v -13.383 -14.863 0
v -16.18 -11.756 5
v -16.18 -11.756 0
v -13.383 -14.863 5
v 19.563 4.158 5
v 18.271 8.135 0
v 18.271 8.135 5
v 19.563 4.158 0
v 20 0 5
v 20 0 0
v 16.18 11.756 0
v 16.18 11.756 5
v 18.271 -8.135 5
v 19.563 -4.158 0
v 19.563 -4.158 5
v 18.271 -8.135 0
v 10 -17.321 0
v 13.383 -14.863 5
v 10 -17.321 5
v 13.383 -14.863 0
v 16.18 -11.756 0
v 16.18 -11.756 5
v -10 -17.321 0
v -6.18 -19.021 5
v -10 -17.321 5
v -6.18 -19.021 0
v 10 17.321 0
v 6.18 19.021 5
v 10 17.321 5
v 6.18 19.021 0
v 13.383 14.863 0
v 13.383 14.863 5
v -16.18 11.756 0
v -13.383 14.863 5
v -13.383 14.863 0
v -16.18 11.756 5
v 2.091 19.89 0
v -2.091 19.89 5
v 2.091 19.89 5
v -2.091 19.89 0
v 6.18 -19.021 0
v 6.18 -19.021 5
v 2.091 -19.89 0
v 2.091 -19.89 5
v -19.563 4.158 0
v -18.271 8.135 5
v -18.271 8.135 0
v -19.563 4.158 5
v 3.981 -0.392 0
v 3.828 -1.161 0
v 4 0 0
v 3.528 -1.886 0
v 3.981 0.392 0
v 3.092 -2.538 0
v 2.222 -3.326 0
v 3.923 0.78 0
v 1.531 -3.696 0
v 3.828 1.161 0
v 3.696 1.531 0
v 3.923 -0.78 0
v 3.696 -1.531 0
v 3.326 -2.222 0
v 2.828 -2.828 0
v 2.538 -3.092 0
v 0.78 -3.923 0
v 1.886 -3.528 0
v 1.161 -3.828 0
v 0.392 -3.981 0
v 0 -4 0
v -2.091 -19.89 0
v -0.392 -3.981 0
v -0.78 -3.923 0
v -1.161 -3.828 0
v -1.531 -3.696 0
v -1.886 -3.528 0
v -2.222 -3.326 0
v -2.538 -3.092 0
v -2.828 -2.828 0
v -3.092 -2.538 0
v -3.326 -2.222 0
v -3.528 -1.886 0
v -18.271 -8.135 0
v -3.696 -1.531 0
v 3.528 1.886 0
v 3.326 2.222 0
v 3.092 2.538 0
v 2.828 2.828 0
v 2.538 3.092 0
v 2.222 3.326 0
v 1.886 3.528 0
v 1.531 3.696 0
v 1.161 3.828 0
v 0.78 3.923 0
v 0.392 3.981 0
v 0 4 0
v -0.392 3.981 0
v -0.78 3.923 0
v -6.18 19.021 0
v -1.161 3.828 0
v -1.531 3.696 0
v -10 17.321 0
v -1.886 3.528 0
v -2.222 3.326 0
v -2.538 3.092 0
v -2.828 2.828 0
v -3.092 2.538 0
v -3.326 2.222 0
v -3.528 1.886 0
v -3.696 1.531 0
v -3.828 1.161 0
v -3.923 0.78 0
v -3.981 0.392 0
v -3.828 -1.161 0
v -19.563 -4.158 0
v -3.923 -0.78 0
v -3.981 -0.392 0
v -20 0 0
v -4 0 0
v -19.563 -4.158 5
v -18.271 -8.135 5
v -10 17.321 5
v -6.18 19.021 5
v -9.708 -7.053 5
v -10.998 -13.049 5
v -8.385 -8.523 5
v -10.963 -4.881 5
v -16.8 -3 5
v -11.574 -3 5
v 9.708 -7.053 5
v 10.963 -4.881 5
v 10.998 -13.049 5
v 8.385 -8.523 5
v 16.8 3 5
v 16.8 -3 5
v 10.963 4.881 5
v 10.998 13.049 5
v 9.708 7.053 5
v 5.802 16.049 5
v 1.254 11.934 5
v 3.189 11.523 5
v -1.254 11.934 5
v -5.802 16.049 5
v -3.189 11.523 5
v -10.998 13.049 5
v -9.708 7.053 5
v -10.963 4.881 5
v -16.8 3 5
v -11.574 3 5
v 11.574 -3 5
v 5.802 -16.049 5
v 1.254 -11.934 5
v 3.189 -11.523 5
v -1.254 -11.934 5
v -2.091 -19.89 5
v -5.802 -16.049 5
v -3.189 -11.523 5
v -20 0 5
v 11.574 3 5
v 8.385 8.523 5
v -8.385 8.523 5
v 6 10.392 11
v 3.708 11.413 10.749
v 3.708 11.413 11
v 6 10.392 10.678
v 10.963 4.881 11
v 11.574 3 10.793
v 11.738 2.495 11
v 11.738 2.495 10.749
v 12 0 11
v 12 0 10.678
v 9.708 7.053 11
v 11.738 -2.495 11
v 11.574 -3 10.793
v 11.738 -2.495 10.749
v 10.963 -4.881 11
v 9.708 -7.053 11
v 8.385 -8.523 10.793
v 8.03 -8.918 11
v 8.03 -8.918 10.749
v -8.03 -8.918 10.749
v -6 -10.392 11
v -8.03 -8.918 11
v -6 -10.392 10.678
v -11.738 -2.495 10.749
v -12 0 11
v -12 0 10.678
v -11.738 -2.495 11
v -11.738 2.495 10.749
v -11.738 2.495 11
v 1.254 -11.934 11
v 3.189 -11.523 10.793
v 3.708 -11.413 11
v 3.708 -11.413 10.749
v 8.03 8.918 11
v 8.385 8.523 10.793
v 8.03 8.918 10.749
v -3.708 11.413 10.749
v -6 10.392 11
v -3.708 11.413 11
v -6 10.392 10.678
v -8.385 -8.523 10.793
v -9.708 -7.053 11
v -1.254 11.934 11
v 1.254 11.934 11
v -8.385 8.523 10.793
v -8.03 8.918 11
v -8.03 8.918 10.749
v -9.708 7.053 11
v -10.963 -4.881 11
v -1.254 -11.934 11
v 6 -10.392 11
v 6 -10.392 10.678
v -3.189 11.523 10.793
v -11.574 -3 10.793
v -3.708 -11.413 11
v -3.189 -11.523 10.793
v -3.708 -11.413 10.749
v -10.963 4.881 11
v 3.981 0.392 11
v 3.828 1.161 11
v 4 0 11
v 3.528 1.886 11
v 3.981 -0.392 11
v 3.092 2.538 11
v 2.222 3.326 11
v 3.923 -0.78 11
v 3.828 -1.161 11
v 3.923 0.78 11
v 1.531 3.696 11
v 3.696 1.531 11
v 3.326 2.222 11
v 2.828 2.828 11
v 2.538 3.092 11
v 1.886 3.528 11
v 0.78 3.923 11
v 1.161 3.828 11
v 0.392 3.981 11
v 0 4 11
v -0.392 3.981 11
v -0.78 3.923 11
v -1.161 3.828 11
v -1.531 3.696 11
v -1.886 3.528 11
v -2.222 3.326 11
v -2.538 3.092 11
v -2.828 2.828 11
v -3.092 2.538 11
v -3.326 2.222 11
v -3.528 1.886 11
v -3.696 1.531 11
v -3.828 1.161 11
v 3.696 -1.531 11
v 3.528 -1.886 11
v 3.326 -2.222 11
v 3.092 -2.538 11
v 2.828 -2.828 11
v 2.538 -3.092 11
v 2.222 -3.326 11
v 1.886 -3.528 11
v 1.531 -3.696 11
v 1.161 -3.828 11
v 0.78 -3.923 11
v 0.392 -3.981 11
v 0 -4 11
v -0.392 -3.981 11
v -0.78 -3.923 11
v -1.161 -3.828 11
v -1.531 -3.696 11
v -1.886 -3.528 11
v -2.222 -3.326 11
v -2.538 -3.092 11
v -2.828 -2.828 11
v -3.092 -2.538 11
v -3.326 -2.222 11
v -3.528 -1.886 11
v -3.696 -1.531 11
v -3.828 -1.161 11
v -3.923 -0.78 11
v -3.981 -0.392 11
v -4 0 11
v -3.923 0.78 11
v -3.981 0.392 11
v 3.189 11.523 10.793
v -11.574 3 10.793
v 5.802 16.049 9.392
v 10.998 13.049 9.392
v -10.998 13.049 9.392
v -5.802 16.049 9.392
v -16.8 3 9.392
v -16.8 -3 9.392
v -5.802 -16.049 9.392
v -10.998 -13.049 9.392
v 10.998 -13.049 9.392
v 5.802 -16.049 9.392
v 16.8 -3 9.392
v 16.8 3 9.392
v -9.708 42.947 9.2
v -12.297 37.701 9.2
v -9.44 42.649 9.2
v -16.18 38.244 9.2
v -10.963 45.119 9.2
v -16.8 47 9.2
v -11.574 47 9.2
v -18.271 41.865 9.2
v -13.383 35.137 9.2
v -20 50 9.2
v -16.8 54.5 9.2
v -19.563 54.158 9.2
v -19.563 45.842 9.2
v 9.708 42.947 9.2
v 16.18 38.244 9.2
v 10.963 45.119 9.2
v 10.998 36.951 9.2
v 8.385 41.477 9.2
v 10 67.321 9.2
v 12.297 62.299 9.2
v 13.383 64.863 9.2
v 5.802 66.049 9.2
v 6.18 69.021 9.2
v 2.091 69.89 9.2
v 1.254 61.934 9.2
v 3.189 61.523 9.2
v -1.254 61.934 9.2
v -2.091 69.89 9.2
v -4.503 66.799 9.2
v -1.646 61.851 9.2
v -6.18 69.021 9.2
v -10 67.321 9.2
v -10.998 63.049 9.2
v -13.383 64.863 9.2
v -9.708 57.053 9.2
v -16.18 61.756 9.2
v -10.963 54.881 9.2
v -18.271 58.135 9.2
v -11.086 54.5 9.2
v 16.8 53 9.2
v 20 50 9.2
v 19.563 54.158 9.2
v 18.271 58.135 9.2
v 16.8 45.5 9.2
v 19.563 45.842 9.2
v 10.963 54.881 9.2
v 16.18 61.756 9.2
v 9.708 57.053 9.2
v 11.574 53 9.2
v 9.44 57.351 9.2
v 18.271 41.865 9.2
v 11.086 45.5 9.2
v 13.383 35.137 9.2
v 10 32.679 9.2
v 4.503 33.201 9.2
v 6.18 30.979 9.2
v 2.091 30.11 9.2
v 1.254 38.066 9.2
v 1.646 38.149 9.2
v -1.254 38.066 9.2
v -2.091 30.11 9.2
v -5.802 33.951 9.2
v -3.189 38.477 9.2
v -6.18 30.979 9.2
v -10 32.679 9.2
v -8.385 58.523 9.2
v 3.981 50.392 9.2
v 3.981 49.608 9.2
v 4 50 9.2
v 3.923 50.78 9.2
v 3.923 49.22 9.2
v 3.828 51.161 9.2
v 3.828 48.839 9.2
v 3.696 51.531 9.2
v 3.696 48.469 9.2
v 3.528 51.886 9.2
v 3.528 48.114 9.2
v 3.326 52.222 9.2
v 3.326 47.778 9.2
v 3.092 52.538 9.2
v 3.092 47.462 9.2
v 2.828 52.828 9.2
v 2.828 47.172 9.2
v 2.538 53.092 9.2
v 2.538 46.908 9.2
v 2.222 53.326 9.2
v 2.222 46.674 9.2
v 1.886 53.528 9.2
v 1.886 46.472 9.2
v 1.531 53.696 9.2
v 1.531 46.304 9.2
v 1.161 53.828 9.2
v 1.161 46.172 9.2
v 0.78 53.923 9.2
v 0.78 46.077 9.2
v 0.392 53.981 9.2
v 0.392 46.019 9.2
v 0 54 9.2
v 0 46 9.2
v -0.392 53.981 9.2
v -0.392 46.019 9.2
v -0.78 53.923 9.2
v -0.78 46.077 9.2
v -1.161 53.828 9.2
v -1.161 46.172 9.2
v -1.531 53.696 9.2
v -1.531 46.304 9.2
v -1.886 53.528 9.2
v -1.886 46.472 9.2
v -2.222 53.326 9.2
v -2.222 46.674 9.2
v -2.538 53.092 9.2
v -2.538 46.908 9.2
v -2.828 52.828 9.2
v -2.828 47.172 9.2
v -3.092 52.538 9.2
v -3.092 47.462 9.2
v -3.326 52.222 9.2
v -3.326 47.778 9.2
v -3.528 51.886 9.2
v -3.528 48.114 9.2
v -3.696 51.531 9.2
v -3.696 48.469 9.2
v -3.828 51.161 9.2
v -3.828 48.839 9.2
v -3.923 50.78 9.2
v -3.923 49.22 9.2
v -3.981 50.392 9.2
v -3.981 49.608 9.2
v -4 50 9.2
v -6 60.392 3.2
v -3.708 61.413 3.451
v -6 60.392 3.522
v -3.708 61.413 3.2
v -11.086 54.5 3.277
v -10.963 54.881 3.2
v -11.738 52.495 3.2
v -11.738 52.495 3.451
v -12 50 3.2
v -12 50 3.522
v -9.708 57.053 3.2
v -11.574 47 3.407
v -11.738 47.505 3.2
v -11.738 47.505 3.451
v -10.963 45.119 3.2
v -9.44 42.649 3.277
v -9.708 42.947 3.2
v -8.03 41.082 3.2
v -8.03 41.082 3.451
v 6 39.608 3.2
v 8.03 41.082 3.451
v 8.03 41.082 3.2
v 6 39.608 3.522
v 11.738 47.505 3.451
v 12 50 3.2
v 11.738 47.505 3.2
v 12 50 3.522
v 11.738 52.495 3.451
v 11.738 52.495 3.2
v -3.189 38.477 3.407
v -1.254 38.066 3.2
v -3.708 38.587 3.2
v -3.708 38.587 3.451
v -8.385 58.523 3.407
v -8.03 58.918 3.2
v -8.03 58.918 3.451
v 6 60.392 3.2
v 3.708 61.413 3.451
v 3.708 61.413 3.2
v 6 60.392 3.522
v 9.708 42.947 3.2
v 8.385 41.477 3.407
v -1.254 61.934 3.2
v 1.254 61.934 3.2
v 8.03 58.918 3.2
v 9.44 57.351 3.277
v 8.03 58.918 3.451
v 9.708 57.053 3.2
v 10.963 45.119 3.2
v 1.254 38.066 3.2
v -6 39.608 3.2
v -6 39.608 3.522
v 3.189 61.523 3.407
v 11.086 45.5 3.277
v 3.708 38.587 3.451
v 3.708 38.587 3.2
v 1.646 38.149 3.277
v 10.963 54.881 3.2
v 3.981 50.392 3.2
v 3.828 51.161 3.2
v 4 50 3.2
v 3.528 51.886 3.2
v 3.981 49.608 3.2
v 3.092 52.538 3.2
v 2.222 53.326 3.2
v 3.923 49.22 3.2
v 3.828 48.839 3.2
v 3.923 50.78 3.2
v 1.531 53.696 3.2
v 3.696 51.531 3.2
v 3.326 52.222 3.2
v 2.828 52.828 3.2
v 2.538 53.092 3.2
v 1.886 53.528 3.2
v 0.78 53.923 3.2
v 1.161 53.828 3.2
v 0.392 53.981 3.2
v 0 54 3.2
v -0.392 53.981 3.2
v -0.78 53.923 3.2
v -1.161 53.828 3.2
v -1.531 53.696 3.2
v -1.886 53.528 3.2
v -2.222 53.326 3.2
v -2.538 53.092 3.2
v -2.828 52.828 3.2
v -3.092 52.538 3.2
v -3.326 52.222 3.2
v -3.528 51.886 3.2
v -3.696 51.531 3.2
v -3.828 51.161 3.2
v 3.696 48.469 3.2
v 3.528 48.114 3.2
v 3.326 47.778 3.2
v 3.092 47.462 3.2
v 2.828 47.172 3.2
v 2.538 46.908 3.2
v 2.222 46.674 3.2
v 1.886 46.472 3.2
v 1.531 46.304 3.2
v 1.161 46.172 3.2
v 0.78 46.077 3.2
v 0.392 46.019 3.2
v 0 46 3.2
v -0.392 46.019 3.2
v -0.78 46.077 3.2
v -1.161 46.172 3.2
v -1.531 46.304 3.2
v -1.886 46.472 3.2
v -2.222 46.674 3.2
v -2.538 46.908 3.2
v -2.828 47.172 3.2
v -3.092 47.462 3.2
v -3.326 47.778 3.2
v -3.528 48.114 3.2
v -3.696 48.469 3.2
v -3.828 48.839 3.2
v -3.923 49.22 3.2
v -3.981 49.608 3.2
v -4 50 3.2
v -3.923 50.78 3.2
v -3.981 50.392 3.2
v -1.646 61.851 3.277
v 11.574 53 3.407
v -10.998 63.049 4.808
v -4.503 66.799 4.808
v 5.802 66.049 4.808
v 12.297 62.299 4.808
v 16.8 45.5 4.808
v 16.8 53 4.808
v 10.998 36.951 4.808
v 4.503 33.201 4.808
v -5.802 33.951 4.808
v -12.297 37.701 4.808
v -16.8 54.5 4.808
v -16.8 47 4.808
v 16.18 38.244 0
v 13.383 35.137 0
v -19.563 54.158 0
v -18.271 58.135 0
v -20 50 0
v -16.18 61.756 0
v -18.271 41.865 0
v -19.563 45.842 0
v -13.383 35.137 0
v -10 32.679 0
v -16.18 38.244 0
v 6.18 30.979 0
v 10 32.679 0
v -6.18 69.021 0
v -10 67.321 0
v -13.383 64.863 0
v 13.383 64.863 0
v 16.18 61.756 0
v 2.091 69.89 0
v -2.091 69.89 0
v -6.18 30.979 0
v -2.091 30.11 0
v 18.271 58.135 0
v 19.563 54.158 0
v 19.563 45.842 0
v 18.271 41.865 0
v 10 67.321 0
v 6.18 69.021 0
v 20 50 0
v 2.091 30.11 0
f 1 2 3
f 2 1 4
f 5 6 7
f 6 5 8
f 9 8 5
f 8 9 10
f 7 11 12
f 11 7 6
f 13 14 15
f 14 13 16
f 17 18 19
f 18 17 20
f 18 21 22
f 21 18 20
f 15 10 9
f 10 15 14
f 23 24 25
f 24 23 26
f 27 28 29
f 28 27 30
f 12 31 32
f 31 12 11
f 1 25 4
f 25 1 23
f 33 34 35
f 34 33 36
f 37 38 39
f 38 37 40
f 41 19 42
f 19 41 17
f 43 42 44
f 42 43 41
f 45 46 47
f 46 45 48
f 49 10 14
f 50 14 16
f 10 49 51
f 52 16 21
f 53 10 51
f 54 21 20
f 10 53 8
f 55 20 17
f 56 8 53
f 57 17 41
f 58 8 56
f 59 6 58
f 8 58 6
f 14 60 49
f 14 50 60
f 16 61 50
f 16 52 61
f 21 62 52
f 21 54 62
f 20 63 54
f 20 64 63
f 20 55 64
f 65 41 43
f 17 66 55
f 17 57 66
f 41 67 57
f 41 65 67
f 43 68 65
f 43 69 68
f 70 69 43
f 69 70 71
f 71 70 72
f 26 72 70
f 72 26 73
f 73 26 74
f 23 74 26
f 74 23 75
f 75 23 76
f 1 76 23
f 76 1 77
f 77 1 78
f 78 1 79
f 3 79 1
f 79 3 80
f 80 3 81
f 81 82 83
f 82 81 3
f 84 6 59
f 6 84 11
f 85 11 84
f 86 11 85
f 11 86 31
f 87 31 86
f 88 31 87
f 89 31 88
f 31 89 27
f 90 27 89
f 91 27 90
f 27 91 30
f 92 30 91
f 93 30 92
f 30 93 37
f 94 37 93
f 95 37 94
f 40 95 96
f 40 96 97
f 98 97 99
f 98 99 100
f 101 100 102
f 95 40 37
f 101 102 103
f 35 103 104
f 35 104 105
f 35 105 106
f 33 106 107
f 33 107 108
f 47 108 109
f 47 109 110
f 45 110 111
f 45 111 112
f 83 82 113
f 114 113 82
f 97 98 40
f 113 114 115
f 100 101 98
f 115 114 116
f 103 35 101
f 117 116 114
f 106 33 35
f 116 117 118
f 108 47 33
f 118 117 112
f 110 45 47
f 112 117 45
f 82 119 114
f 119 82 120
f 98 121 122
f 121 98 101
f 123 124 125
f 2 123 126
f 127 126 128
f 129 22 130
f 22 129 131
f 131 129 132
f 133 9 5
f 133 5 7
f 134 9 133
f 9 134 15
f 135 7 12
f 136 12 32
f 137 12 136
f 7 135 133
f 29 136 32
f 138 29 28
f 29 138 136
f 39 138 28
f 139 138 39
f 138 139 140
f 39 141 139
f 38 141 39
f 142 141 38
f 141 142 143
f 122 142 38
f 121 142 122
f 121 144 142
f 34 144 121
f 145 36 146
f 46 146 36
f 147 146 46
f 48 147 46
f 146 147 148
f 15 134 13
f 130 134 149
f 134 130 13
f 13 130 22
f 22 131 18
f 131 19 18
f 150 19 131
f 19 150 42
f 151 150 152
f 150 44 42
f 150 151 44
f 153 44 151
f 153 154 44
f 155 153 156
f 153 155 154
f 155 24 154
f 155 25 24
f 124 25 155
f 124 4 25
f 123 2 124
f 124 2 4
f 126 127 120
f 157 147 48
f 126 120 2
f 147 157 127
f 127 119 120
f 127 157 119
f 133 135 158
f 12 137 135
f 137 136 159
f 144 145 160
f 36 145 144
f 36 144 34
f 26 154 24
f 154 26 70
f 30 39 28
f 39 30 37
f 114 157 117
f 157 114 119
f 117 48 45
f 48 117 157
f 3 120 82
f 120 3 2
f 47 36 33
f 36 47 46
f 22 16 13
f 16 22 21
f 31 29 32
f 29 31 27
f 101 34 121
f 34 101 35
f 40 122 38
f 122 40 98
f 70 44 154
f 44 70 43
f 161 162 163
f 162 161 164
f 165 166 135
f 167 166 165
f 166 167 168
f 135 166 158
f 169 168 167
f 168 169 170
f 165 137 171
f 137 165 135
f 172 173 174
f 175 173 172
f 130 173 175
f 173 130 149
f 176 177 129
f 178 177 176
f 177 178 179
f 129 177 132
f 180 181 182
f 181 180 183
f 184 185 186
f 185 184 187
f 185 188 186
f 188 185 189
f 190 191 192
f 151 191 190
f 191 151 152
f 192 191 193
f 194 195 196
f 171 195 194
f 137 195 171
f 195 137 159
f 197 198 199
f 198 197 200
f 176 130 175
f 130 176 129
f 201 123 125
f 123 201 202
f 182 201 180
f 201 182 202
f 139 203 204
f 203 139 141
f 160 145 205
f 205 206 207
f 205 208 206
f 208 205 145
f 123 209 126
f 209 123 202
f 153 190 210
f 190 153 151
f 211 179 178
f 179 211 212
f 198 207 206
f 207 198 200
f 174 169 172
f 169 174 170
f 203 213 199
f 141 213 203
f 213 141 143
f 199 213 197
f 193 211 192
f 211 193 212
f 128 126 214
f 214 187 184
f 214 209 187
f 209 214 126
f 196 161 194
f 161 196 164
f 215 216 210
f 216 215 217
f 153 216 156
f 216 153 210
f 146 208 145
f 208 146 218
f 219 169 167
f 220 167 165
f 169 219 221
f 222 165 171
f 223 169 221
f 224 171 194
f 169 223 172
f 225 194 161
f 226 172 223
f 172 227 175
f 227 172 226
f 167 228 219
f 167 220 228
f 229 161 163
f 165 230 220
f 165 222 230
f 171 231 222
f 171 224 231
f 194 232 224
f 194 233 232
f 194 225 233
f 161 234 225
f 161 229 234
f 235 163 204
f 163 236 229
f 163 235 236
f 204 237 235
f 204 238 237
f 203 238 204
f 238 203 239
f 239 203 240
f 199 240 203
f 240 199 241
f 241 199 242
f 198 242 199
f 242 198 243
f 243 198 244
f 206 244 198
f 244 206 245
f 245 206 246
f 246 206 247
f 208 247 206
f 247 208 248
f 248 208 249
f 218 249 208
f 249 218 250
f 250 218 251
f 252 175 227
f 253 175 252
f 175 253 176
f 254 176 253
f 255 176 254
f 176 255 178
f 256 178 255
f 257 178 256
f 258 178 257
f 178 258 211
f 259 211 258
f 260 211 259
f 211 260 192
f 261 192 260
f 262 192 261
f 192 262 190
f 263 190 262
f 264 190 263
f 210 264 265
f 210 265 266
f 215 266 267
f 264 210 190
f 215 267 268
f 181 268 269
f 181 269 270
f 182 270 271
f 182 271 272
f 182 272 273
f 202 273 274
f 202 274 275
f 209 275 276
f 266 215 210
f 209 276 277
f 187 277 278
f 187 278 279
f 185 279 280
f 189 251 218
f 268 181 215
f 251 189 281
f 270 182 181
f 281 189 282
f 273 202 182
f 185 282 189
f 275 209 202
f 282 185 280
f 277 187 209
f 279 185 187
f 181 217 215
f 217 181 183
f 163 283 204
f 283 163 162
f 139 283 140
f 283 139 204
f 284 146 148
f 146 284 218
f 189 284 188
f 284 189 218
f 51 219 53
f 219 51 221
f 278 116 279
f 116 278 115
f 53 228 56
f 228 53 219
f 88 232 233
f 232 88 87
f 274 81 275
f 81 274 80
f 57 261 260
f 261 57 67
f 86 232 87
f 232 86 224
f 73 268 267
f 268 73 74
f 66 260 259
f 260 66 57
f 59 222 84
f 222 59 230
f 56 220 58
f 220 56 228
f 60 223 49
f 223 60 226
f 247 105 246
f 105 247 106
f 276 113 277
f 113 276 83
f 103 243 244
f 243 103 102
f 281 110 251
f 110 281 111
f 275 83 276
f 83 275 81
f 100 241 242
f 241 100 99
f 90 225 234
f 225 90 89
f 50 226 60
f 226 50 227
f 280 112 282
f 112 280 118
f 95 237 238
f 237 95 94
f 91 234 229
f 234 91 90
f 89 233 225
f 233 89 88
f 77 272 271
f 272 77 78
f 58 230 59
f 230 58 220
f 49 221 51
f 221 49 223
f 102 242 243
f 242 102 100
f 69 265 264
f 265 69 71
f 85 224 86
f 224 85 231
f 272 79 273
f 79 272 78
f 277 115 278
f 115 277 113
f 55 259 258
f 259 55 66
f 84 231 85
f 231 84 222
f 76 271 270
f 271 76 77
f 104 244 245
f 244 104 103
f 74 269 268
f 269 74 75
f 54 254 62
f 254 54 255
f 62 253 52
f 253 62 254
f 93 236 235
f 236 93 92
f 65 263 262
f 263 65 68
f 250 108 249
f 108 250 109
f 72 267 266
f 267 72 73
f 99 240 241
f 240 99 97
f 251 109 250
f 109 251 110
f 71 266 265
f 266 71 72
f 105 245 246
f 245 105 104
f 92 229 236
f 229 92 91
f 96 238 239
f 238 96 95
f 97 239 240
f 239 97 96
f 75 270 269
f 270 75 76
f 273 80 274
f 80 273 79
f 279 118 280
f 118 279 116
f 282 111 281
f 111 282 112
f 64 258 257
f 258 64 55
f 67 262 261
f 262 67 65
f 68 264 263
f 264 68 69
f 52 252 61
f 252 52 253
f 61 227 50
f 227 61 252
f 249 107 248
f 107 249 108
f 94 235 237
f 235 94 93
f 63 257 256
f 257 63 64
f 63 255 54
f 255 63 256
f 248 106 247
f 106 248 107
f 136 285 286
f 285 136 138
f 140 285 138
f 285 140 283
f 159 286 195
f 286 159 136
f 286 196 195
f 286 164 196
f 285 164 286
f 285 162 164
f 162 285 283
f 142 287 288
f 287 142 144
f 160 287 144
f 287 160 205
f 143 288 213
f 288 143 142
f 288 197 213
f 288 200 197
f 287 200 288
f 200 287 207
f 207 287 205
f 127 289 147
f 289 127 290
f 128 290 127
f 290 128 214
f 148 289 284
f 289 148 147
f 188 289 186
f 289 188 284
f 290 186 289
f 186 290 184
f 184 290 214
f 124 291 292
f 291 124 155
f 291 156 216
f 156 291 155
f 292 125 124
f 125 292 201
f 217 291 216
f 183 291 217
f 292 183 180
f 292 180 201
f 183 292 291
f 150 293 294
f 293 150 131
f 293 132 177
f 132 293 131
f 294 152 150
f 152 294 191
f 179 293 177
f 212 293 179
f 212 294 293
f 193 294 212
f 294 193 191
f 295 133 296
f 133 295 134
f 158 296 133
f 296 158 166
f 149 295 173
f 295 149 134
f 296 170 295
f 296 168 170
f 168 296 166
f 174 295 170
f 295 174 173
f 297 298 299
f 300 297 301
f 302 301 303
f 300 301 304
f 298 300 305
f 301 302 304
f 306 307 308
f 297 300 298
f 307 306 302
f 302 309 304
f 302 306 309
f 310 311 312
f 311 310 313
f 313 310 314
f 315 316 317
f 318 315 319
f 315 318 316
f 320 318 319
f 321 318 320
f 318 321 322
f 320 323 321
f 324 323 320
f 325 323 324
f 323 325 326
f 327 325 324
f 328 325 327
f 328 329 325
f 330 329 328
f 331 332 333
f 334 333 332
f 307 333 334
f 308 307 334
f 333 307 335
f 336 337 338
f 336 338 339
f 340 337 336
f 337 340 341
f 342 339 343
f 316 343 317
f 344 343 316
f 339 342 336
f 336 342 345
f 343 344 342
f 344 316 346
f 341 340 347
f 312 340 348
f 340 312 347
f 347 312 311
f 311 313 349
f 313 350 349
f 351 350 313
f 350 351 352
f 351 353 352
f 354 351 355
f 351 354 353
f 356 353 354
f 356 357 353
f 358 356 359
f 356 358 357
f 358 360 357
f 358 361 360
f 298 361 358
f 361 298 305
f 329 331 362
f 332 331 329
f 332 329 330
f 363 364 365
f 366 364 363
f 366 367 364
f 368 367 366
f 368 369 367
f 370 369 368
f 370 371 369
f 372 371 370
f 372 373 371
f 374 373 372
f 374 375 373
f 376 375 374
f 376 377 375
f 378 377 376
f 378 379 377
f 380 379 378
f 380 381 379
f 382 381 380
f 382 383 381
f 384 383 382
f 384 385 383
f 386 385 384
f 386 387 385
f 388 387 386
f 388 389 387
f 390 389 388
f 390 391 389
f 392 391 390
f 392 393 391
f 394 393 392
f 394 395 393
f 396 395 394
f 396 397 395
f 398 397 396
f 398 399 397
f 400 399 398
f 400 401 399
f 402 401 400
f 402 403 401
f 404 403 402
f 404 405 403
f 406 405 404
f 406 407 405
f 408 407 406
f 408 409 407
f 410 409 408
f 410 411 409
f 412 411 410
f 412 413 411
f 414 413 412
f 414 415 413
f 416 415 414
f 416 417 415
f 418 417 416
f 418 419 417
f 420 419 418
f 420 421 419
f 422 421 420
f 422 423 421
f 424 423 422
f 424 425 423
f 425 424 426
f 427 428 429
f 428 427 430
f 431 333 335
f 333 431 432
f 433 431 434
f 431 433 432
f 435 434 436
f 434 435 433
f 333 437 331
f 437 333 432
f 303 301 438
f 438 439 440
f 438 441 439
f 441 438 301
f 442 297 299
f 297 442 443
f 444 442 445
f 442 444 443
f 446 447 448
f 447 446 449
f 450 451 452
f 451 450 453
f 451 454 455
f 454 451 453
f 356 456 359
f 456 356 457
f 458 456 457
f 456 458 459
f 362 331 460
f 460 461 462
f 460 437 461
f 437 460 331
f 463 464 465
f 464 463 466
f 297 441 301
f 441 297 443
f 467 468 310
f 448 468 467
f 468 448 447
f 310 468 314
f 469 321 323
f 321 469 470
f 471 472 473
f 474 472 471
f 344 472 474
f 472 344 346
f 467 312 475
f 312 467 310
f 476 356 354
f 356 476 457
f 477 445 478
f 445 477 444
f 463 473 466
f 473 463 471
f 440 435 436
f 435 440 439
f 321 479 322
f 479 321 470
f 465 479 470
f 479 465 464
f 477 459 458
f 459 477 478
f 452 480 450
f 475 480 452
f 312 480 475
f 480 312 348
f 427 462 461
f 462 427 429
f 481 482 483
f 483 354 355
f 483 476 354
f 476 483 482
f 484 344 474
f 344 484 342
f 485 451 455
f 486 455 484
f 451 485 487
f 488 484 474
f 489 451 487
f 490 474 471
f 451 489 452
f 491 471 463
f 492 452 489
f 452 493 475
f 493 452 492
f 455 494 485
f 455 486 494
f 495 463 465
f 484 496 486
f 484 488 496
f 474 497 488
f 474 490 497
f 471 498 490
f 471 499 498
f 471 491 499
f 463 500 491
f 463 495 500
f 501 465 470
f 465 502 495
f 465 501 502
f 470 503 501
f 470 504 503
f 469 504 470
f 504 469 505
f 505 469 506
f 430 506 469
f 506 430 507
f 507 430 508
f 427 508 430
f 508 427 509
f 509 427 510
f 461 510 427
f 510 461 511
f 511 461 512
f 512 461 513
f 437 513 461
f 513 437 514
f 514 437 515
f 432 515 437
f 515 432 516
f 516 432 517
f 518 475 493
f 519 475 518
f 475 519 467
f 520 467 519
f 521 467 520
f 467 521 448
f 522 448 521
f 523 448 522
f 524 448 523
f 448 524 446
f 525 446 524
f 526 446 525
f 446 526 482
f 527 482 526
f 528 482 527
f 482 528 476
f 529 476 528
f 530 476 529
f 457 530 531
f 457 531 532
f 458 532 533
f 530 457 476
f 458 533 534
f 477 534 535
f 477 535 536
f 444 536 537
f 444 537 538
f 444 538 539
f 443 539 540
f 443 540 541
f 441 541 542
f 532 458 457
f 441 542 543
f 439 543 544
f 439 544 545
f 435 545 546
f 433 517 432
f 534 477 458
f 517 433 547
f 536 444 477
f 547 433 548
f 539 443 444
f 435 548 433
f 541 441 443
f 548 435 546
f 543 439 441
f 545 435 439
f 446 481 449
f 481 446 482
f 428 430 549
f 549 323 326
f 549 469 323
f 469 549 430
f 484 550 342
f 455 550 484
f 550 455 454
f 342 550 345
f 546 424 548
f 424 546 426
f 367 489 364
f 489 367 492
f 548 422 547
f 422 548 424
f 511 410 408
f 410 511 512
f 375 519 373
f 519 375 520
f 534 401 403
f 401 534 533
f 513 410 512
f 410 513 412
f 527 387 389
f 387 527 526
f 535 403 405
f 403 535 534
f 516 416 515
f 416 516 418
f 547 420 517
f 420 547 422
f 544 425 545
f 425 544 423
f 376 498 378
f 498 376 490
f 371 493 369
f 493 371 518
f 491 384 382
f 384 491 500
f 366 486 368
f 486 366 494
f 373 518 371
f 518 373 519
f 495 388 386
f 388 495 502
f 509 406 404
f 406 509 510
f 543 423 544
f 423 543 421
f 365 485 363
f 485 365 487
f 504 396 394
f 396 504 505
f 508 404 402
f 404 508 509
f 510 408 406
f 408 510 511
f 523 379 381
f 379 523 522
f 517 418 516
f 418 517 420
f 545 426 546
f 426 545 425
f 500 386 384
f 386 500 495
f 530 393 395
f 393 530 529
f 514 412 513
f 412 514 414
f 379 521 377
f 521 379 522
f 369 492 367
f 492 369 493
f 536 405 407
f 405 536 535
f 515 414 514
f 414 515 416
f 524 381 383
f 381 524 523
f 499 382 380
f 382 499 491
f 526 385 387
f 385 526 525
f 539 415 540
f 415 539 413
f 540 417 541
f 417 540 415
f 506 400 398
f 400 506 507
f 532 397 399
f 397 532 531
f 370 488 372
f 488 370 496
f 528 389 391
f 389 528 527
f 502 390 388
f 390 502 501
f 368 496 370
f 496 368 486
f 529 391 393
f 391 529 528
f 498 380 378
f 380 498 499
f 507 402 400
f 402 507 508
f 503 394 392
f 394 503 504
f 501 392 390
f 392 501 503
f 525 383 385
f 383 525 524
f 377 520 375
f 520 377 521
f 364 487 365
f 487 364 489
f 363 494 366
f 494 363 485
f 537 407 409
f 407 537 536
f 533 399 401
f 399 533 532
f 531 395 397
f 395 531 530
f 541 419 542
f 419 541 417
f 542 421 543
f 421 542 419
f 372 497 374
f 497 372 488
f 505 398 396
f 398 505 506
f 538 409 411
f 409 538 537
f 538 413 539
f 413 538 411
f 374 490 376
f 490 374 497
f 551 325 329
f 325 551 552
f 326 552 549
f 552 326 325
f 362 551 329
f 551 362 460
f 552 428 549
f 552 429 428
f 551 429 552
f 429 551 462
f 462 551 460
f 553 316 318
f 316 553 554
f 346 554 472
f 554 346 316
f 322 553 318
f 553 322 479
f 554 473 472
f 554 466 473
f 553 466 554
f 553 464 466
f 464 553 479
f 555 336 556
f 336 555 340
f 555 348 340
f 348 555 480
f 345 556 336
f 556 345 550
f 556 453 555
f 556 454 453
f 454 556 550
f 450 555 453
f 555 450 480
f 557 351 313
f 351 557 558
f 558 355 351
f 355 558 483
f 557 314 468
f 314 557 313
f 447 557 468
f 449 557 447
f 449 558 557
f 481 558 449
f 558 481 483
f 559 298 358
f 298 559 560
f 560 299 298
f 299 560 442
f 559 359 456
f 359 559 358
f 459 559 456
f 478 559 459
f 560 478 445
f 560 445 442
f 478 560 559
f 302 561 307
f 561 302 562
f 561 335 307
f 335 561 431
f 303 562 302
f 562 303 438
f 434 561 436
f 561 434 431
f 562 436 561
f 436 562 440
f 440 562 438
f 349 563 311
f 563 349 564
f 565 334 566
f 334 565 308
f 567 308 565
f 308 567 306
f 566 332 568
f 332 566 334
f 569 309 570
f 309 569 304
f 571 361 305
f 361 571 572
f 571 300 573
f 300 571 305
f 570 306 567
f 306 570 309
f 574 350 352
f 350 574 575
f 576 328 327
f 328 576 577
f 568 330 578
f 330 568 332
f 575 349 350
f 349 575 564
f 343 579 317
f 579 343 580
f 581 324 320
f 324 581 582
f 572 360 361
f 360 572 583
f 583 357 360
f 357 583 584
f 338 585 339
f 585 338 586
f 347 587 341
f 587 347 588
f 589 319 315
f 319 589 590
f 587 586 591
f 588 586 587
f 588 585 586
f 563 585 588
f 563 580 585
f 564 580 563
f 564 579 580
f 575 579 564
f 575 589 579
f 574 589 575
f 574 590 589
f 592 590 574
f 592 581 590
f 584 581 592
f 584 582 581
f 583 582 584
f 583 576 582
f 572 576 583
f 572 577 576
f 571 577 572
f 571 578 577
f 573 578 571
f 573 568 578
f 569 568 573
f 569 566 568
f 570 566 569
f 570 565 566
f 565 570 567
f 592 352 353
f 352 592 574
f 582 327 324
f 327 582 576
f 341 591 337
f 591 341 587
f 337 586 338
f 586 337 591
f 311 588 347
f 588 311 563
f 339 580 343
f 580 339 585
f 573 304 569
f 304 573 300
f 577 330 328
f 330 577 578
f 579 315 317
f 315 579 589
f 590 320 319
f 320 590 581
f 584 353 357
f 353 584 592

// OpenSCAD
gear_diam = 40;
gear_thick = 5;
hub_diam = 24;
hub_thick = 6;

/*
 * placeholder flat gear
 */
module gear(diam=gear_diam, hub_diam=hub_diam, thick=gear_thick, hub_thick=hub_thick, shaft_diam=8, teeth=24) {
	difference() {
		union() {
			cylinder(d=diam, h=thick);
			translate([0, 0, thick])
				cylinder(d=hub_diam, h=hub_thick);
		}
		shaft(shaft_diam);
	}
}


/*
 *  wrapper on a gear()
 *  TBD: make dogs circle edged
 */

// working?
module dogged(diam=hub_diam*.9, depth=hub_thick, width=hub_thick, hgt=2*hub_thick, num=6) {
	angle = 360/num;
	
	union() {
		children(0); 	// gear();
		
		for (i = [1:num]) {
			rotate([0, 0, angle*i])
				translate([diam/2, -depth/2, gear_thick]) 
					difference() {
						// dog tooth
						cube([depth, width, depth]);
					
						// bevel plane
						translate([0, 0, depth])
							rotate([0, 15, 0])
								cube([depth*2, width*2, depth]);
					}
		}
	}
}


// attempting bevel
module dogged_beveled(diam=hub_diam, depth=hub_thick, hgt=2*hub_thick, num=6) {
	angle = 360/num;
	
	union() {
		children(0); 	// gear();
		
		for (i = [1:num]) {
			translate([0, 0, -depth])
			rotate([0, 0, angle*i]) {
					translate([diam/2, -depth/2, hgt]) {
						
						// beveling...
						difference() {
							
							// dog tooth
							cube([depth, depth, depth]);
							
							// bevel plane
							translate([0, 0, depth])
								rotate([0, 15, 0])
									cube([depth*2, depth*2, depth]);
						}
					}
			}
			
 		}
	}
}


// funky way to do it?
module dogged_diff(diam=9, depth=3, hgt=4+4, num=6) {
	angle = 360/num;
	
	difference() {
		children(0); 	// gear();
		
		for (i = [1:num]) {
			rotate([0, 0, angle*i]) {
					translate([diam/2, -depth/2, hgt-depth/2]) {
						cube([depth, depth, depth]);
				}
			}
			
 		}
	}
}

module shaft(diam) {
	translate([0, 0, -100])
		cylinder(d=diam, h=200, $fn=64);
}



depth = 5;



// figuring out bevel mechanics
*difference() {

	// dog tooth
	cube([depth, depth, depth]);

	// bevel plane
	translate([-1, -1, depth])
		rotate([0, 15, 0])
			cube([2*depth, 2*depth, depth]);
	
}


// gear with dog teeth
dogged() 
 gear();


/*
 * mating part
 * TBD: parametrize dog negatives wider than the gear version's
 */
ht = gear_thick + hub_thick*.7;

translate([0, 50, 0]) {

translate([0, 0, ht])	
rotate([0, 180, 0]) 
translate([0, 0, -gear_thick])
		difference() {
			translate([0, 0, gear_thick])
				cylinder(d=gear_diam, h=gear_thick + hub_thick*.7);
			dogged(hub_diam*.9, hub_thick, hub_thick*1.25, 2*hub_thick, 6)
				gear();
		}
}
